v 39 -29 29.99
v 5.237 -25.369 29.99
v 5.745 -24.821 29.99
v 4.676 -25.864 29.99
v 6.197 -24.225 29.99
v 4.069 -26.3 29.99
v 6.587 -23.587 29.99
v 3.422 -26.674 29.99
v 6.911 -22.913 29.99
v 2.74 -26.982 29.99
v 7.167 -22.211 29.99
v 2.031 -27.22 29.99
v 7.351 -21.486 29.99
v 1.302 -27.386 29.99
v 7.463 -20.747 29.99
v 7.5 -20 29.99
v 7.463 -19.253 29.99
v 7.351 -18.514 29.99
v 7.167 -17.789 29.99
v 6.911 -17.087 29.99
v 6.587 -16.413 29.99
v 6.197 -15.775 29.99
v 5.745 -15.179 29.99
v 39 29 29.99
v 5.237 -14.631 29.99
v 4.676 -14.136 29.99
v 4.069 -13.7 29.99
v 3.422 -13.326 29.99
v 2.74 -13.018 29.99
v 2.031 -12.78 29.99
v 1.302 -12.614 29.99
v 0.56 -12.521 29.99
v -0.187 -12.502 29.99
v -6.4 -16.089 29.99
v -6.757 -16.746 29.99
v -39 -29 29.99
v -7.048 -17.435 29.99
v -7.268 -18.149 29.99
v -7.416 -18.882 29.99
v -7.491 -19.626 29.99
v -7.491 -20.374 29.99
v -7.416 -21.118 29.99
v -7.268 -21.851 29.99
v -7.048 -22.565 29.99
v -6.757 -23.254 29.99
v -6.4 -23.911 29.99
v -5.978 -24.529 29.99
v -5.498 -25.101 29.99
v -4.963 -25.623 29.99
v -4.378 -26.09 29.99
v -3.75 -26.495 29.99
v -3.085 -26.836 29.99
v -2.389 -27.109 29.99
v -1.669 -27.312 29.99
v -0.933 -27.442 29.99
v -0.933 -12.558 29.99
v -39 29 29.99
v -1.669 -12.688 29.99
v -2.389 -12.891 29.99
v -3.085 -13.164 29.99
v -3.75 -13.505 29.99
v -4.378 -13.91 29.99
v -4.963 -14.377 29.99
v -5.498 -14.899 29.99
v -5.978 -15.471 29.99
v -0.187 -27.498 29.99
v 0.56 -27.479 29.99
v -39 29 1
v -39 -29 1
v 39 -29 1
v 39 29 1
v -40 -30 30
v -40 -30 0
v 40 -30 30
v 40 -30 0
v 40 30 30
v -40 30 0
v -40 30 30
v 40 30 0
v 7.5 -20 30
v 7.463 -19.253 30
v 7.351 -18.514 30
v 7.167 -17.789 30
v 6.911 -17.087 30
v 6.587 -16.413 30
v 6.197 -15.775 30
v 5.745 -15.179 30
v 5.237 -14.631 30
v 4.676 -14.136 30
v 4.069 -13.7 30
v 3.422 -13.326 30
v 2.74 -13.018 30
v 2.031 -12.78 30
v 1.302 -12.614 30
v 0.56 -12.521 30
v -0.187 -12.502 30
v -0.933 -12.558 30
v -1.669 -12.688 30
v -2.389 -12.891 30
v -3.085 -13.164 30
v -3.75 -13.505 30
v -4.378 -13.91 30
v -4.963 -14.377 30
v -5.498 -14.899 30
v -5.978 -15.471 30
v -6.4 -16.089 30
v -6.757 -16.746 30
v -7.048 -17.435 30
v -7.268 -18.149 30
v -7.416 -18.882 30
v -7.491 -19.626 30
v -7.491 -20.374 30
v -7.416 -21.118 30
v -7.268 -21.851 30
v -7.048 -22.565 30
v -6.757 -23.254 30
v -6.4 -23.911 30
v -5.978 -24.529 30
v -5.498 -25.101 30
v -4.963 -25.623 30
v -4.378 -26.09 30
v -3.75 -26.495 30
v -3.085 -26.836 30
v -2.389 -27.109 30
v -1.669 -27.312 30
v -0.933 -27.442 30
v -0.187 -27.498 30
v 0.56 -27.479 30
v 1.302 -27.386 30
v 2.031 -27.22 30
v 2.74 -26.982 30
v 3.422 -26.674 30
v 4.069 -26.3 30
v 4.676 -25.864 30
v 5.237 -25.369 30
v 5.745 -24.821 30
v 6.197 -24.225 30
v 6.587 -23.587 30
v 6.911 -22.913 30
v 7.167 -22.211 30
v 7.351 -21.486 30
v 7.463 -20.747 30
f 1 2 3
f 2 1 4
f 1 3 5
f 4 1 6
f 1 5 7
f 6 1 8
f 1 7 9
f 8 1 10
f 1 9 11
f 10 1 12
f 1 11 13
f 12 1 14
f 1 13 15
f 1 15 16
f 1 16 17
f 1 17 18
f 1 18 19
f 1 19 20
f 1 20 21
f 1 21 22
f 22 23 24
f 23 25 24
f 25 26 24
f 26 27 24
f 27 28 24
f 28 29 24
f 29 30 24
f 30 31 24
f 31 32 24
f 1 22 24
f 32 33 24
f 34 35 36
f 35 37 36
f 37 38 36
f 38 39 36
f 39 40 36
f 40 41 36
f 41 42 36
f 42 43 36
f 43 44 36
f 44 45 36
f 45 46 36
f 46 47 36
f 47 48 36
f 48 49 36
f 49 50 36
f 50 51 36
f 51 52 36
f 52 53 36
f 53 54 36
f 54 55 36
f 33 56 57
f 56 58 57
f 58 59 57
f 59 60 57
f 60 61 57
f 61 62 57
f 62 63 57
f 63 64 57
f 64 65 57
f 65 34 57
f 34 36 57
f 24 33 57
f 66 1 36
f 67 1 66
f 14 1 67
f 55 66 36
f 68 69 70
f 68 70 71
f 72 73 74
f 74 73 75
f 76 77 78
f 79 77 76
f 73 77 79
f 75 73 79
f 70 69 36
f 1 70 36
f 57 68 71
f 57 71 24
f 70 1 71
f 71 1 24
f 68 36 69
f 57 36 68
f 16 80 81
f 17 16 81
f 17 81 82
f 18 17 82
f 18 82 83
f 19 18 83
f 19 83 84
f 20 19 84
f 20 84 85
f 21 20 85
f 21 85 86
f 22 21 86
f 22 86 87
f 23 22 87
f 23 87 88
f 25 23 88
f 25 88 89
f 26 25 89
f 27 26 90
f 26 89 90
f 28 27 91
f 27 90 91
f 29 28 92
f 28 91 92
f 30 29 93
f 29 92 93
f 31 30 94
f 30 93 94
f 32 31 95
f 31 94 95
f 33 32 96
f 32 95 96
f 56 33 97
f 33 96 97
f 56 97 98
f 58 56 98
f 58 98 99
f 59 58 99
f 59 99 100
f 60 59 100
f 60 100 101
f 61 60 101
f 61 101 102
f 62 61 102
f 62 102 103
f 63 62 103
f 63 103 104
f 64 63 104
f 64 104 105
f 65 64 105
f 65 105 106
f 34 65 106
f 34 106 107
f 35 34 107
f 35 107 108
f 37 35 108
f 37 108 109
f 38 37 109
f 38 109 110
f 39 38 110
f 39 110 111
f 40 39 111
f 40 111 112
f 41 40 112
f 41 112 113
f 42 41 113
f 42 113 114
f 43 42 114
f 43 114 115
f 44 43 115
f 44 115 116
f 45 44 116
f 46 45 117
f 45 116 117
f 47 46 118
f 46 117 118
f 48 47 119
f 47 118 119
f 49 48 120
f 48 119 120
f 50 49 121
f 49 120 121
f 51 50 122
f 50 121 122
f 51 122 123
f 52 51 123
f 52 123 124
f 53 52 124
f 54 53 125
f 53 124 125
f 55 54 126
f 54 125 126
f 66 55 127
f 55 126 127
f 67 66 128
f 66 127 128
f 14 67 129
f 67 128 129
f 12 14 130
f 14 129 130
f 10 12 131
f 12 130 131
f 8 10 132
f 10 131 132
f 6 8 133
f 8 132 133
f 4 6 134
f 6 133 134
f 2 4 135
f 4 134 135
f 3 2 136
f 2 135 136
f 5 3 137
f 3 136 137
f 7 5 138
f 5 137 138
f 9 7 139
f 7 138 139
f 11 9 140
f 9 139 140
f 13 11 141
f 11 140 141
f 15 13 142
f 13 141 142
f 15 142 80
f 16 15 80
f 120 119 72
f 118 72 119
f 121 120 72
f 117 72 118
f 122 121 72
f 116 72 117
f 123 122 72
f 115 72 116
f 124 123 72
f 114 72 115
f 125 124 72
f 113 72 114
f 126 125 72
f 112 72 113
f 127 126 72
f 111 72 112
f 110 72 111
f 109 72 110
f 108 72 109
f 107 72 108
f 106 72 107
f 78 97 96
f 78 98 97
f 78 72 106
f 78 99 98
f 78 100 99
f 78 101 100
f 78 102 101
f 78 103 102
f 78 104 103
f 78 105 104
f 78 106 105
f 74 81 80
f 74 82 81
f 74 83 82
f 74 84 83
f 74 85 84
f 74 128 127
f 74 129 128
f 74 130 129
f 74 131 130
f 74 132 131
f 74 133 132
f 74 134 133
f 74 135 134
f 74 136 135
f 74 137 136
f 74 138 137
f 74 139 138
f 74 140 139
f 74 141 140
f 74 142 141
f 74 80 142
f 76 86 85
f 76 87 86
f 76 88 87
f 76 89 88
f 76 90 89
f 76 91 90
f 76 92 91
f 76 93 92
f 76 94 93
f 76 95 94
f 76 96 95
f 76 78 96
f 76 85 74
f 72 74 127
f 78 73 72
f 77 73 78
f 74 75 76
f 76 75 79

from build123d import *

# Parameters (mm, degrees)
SKETCH1_W           = 80
SKETCH1_H           = 60
BOSS_EXTRUDE1_DEPTH = 30
SHELL1_START        = -39
SHELL1_OUTLINE_W    = 58
SHELL1_OUTLINE_H    = 28.99
SHELL1_DEPTH        = 78
CUT_EXTRUDE4_REACH  = 60.31
SKETCH2_R           = 7.5


# Read off the part's stored shape, not the designer's step: Shell1
with BuildPart() as part:
    # Sketch1 → Boss-Extrude1 (new body)
    with BuildSketch(Plane.XY):
        Rectangle(SKETCH1_W, SKETCH1_H)
    extrude(amount=BOSS_EXTRUDE1_DEPTH)

    # Shell1 outline → Shell1 (cut)
    with BuildSketch(Plane.YZ.offset(SHELL1_START)):
        with Locations((0, 15.495)):
            Rectangle(SHELL1_OUTLINE_W, SHELL1_OUTLINE_H)
    extrude(amount=SHELL1_DEPTH, mode=Mode.SUBTRACT)

    # Sketch2 → Cut-Extrude4 (cut, up to next)
    with BuildSketch(Plane.XY.offset(30), mode=Mode.PRIVATE) as cut_extrude4_sk1:
        with Locations((0, -20)):
            Circle(SKETCH2_R)
    cut_extrude4_tool1 = extrude(cut_extrude4_sk1.sketch, amount=-CUT_EXTRUDE4_REACH, mode=Mode.PRIVATE) & part.part
    add(cut_extrude4_tool1.solids().sort_by_distance((0, -20, 30))[0], mode=Mode.SUBTRACT)


solid = part.part
